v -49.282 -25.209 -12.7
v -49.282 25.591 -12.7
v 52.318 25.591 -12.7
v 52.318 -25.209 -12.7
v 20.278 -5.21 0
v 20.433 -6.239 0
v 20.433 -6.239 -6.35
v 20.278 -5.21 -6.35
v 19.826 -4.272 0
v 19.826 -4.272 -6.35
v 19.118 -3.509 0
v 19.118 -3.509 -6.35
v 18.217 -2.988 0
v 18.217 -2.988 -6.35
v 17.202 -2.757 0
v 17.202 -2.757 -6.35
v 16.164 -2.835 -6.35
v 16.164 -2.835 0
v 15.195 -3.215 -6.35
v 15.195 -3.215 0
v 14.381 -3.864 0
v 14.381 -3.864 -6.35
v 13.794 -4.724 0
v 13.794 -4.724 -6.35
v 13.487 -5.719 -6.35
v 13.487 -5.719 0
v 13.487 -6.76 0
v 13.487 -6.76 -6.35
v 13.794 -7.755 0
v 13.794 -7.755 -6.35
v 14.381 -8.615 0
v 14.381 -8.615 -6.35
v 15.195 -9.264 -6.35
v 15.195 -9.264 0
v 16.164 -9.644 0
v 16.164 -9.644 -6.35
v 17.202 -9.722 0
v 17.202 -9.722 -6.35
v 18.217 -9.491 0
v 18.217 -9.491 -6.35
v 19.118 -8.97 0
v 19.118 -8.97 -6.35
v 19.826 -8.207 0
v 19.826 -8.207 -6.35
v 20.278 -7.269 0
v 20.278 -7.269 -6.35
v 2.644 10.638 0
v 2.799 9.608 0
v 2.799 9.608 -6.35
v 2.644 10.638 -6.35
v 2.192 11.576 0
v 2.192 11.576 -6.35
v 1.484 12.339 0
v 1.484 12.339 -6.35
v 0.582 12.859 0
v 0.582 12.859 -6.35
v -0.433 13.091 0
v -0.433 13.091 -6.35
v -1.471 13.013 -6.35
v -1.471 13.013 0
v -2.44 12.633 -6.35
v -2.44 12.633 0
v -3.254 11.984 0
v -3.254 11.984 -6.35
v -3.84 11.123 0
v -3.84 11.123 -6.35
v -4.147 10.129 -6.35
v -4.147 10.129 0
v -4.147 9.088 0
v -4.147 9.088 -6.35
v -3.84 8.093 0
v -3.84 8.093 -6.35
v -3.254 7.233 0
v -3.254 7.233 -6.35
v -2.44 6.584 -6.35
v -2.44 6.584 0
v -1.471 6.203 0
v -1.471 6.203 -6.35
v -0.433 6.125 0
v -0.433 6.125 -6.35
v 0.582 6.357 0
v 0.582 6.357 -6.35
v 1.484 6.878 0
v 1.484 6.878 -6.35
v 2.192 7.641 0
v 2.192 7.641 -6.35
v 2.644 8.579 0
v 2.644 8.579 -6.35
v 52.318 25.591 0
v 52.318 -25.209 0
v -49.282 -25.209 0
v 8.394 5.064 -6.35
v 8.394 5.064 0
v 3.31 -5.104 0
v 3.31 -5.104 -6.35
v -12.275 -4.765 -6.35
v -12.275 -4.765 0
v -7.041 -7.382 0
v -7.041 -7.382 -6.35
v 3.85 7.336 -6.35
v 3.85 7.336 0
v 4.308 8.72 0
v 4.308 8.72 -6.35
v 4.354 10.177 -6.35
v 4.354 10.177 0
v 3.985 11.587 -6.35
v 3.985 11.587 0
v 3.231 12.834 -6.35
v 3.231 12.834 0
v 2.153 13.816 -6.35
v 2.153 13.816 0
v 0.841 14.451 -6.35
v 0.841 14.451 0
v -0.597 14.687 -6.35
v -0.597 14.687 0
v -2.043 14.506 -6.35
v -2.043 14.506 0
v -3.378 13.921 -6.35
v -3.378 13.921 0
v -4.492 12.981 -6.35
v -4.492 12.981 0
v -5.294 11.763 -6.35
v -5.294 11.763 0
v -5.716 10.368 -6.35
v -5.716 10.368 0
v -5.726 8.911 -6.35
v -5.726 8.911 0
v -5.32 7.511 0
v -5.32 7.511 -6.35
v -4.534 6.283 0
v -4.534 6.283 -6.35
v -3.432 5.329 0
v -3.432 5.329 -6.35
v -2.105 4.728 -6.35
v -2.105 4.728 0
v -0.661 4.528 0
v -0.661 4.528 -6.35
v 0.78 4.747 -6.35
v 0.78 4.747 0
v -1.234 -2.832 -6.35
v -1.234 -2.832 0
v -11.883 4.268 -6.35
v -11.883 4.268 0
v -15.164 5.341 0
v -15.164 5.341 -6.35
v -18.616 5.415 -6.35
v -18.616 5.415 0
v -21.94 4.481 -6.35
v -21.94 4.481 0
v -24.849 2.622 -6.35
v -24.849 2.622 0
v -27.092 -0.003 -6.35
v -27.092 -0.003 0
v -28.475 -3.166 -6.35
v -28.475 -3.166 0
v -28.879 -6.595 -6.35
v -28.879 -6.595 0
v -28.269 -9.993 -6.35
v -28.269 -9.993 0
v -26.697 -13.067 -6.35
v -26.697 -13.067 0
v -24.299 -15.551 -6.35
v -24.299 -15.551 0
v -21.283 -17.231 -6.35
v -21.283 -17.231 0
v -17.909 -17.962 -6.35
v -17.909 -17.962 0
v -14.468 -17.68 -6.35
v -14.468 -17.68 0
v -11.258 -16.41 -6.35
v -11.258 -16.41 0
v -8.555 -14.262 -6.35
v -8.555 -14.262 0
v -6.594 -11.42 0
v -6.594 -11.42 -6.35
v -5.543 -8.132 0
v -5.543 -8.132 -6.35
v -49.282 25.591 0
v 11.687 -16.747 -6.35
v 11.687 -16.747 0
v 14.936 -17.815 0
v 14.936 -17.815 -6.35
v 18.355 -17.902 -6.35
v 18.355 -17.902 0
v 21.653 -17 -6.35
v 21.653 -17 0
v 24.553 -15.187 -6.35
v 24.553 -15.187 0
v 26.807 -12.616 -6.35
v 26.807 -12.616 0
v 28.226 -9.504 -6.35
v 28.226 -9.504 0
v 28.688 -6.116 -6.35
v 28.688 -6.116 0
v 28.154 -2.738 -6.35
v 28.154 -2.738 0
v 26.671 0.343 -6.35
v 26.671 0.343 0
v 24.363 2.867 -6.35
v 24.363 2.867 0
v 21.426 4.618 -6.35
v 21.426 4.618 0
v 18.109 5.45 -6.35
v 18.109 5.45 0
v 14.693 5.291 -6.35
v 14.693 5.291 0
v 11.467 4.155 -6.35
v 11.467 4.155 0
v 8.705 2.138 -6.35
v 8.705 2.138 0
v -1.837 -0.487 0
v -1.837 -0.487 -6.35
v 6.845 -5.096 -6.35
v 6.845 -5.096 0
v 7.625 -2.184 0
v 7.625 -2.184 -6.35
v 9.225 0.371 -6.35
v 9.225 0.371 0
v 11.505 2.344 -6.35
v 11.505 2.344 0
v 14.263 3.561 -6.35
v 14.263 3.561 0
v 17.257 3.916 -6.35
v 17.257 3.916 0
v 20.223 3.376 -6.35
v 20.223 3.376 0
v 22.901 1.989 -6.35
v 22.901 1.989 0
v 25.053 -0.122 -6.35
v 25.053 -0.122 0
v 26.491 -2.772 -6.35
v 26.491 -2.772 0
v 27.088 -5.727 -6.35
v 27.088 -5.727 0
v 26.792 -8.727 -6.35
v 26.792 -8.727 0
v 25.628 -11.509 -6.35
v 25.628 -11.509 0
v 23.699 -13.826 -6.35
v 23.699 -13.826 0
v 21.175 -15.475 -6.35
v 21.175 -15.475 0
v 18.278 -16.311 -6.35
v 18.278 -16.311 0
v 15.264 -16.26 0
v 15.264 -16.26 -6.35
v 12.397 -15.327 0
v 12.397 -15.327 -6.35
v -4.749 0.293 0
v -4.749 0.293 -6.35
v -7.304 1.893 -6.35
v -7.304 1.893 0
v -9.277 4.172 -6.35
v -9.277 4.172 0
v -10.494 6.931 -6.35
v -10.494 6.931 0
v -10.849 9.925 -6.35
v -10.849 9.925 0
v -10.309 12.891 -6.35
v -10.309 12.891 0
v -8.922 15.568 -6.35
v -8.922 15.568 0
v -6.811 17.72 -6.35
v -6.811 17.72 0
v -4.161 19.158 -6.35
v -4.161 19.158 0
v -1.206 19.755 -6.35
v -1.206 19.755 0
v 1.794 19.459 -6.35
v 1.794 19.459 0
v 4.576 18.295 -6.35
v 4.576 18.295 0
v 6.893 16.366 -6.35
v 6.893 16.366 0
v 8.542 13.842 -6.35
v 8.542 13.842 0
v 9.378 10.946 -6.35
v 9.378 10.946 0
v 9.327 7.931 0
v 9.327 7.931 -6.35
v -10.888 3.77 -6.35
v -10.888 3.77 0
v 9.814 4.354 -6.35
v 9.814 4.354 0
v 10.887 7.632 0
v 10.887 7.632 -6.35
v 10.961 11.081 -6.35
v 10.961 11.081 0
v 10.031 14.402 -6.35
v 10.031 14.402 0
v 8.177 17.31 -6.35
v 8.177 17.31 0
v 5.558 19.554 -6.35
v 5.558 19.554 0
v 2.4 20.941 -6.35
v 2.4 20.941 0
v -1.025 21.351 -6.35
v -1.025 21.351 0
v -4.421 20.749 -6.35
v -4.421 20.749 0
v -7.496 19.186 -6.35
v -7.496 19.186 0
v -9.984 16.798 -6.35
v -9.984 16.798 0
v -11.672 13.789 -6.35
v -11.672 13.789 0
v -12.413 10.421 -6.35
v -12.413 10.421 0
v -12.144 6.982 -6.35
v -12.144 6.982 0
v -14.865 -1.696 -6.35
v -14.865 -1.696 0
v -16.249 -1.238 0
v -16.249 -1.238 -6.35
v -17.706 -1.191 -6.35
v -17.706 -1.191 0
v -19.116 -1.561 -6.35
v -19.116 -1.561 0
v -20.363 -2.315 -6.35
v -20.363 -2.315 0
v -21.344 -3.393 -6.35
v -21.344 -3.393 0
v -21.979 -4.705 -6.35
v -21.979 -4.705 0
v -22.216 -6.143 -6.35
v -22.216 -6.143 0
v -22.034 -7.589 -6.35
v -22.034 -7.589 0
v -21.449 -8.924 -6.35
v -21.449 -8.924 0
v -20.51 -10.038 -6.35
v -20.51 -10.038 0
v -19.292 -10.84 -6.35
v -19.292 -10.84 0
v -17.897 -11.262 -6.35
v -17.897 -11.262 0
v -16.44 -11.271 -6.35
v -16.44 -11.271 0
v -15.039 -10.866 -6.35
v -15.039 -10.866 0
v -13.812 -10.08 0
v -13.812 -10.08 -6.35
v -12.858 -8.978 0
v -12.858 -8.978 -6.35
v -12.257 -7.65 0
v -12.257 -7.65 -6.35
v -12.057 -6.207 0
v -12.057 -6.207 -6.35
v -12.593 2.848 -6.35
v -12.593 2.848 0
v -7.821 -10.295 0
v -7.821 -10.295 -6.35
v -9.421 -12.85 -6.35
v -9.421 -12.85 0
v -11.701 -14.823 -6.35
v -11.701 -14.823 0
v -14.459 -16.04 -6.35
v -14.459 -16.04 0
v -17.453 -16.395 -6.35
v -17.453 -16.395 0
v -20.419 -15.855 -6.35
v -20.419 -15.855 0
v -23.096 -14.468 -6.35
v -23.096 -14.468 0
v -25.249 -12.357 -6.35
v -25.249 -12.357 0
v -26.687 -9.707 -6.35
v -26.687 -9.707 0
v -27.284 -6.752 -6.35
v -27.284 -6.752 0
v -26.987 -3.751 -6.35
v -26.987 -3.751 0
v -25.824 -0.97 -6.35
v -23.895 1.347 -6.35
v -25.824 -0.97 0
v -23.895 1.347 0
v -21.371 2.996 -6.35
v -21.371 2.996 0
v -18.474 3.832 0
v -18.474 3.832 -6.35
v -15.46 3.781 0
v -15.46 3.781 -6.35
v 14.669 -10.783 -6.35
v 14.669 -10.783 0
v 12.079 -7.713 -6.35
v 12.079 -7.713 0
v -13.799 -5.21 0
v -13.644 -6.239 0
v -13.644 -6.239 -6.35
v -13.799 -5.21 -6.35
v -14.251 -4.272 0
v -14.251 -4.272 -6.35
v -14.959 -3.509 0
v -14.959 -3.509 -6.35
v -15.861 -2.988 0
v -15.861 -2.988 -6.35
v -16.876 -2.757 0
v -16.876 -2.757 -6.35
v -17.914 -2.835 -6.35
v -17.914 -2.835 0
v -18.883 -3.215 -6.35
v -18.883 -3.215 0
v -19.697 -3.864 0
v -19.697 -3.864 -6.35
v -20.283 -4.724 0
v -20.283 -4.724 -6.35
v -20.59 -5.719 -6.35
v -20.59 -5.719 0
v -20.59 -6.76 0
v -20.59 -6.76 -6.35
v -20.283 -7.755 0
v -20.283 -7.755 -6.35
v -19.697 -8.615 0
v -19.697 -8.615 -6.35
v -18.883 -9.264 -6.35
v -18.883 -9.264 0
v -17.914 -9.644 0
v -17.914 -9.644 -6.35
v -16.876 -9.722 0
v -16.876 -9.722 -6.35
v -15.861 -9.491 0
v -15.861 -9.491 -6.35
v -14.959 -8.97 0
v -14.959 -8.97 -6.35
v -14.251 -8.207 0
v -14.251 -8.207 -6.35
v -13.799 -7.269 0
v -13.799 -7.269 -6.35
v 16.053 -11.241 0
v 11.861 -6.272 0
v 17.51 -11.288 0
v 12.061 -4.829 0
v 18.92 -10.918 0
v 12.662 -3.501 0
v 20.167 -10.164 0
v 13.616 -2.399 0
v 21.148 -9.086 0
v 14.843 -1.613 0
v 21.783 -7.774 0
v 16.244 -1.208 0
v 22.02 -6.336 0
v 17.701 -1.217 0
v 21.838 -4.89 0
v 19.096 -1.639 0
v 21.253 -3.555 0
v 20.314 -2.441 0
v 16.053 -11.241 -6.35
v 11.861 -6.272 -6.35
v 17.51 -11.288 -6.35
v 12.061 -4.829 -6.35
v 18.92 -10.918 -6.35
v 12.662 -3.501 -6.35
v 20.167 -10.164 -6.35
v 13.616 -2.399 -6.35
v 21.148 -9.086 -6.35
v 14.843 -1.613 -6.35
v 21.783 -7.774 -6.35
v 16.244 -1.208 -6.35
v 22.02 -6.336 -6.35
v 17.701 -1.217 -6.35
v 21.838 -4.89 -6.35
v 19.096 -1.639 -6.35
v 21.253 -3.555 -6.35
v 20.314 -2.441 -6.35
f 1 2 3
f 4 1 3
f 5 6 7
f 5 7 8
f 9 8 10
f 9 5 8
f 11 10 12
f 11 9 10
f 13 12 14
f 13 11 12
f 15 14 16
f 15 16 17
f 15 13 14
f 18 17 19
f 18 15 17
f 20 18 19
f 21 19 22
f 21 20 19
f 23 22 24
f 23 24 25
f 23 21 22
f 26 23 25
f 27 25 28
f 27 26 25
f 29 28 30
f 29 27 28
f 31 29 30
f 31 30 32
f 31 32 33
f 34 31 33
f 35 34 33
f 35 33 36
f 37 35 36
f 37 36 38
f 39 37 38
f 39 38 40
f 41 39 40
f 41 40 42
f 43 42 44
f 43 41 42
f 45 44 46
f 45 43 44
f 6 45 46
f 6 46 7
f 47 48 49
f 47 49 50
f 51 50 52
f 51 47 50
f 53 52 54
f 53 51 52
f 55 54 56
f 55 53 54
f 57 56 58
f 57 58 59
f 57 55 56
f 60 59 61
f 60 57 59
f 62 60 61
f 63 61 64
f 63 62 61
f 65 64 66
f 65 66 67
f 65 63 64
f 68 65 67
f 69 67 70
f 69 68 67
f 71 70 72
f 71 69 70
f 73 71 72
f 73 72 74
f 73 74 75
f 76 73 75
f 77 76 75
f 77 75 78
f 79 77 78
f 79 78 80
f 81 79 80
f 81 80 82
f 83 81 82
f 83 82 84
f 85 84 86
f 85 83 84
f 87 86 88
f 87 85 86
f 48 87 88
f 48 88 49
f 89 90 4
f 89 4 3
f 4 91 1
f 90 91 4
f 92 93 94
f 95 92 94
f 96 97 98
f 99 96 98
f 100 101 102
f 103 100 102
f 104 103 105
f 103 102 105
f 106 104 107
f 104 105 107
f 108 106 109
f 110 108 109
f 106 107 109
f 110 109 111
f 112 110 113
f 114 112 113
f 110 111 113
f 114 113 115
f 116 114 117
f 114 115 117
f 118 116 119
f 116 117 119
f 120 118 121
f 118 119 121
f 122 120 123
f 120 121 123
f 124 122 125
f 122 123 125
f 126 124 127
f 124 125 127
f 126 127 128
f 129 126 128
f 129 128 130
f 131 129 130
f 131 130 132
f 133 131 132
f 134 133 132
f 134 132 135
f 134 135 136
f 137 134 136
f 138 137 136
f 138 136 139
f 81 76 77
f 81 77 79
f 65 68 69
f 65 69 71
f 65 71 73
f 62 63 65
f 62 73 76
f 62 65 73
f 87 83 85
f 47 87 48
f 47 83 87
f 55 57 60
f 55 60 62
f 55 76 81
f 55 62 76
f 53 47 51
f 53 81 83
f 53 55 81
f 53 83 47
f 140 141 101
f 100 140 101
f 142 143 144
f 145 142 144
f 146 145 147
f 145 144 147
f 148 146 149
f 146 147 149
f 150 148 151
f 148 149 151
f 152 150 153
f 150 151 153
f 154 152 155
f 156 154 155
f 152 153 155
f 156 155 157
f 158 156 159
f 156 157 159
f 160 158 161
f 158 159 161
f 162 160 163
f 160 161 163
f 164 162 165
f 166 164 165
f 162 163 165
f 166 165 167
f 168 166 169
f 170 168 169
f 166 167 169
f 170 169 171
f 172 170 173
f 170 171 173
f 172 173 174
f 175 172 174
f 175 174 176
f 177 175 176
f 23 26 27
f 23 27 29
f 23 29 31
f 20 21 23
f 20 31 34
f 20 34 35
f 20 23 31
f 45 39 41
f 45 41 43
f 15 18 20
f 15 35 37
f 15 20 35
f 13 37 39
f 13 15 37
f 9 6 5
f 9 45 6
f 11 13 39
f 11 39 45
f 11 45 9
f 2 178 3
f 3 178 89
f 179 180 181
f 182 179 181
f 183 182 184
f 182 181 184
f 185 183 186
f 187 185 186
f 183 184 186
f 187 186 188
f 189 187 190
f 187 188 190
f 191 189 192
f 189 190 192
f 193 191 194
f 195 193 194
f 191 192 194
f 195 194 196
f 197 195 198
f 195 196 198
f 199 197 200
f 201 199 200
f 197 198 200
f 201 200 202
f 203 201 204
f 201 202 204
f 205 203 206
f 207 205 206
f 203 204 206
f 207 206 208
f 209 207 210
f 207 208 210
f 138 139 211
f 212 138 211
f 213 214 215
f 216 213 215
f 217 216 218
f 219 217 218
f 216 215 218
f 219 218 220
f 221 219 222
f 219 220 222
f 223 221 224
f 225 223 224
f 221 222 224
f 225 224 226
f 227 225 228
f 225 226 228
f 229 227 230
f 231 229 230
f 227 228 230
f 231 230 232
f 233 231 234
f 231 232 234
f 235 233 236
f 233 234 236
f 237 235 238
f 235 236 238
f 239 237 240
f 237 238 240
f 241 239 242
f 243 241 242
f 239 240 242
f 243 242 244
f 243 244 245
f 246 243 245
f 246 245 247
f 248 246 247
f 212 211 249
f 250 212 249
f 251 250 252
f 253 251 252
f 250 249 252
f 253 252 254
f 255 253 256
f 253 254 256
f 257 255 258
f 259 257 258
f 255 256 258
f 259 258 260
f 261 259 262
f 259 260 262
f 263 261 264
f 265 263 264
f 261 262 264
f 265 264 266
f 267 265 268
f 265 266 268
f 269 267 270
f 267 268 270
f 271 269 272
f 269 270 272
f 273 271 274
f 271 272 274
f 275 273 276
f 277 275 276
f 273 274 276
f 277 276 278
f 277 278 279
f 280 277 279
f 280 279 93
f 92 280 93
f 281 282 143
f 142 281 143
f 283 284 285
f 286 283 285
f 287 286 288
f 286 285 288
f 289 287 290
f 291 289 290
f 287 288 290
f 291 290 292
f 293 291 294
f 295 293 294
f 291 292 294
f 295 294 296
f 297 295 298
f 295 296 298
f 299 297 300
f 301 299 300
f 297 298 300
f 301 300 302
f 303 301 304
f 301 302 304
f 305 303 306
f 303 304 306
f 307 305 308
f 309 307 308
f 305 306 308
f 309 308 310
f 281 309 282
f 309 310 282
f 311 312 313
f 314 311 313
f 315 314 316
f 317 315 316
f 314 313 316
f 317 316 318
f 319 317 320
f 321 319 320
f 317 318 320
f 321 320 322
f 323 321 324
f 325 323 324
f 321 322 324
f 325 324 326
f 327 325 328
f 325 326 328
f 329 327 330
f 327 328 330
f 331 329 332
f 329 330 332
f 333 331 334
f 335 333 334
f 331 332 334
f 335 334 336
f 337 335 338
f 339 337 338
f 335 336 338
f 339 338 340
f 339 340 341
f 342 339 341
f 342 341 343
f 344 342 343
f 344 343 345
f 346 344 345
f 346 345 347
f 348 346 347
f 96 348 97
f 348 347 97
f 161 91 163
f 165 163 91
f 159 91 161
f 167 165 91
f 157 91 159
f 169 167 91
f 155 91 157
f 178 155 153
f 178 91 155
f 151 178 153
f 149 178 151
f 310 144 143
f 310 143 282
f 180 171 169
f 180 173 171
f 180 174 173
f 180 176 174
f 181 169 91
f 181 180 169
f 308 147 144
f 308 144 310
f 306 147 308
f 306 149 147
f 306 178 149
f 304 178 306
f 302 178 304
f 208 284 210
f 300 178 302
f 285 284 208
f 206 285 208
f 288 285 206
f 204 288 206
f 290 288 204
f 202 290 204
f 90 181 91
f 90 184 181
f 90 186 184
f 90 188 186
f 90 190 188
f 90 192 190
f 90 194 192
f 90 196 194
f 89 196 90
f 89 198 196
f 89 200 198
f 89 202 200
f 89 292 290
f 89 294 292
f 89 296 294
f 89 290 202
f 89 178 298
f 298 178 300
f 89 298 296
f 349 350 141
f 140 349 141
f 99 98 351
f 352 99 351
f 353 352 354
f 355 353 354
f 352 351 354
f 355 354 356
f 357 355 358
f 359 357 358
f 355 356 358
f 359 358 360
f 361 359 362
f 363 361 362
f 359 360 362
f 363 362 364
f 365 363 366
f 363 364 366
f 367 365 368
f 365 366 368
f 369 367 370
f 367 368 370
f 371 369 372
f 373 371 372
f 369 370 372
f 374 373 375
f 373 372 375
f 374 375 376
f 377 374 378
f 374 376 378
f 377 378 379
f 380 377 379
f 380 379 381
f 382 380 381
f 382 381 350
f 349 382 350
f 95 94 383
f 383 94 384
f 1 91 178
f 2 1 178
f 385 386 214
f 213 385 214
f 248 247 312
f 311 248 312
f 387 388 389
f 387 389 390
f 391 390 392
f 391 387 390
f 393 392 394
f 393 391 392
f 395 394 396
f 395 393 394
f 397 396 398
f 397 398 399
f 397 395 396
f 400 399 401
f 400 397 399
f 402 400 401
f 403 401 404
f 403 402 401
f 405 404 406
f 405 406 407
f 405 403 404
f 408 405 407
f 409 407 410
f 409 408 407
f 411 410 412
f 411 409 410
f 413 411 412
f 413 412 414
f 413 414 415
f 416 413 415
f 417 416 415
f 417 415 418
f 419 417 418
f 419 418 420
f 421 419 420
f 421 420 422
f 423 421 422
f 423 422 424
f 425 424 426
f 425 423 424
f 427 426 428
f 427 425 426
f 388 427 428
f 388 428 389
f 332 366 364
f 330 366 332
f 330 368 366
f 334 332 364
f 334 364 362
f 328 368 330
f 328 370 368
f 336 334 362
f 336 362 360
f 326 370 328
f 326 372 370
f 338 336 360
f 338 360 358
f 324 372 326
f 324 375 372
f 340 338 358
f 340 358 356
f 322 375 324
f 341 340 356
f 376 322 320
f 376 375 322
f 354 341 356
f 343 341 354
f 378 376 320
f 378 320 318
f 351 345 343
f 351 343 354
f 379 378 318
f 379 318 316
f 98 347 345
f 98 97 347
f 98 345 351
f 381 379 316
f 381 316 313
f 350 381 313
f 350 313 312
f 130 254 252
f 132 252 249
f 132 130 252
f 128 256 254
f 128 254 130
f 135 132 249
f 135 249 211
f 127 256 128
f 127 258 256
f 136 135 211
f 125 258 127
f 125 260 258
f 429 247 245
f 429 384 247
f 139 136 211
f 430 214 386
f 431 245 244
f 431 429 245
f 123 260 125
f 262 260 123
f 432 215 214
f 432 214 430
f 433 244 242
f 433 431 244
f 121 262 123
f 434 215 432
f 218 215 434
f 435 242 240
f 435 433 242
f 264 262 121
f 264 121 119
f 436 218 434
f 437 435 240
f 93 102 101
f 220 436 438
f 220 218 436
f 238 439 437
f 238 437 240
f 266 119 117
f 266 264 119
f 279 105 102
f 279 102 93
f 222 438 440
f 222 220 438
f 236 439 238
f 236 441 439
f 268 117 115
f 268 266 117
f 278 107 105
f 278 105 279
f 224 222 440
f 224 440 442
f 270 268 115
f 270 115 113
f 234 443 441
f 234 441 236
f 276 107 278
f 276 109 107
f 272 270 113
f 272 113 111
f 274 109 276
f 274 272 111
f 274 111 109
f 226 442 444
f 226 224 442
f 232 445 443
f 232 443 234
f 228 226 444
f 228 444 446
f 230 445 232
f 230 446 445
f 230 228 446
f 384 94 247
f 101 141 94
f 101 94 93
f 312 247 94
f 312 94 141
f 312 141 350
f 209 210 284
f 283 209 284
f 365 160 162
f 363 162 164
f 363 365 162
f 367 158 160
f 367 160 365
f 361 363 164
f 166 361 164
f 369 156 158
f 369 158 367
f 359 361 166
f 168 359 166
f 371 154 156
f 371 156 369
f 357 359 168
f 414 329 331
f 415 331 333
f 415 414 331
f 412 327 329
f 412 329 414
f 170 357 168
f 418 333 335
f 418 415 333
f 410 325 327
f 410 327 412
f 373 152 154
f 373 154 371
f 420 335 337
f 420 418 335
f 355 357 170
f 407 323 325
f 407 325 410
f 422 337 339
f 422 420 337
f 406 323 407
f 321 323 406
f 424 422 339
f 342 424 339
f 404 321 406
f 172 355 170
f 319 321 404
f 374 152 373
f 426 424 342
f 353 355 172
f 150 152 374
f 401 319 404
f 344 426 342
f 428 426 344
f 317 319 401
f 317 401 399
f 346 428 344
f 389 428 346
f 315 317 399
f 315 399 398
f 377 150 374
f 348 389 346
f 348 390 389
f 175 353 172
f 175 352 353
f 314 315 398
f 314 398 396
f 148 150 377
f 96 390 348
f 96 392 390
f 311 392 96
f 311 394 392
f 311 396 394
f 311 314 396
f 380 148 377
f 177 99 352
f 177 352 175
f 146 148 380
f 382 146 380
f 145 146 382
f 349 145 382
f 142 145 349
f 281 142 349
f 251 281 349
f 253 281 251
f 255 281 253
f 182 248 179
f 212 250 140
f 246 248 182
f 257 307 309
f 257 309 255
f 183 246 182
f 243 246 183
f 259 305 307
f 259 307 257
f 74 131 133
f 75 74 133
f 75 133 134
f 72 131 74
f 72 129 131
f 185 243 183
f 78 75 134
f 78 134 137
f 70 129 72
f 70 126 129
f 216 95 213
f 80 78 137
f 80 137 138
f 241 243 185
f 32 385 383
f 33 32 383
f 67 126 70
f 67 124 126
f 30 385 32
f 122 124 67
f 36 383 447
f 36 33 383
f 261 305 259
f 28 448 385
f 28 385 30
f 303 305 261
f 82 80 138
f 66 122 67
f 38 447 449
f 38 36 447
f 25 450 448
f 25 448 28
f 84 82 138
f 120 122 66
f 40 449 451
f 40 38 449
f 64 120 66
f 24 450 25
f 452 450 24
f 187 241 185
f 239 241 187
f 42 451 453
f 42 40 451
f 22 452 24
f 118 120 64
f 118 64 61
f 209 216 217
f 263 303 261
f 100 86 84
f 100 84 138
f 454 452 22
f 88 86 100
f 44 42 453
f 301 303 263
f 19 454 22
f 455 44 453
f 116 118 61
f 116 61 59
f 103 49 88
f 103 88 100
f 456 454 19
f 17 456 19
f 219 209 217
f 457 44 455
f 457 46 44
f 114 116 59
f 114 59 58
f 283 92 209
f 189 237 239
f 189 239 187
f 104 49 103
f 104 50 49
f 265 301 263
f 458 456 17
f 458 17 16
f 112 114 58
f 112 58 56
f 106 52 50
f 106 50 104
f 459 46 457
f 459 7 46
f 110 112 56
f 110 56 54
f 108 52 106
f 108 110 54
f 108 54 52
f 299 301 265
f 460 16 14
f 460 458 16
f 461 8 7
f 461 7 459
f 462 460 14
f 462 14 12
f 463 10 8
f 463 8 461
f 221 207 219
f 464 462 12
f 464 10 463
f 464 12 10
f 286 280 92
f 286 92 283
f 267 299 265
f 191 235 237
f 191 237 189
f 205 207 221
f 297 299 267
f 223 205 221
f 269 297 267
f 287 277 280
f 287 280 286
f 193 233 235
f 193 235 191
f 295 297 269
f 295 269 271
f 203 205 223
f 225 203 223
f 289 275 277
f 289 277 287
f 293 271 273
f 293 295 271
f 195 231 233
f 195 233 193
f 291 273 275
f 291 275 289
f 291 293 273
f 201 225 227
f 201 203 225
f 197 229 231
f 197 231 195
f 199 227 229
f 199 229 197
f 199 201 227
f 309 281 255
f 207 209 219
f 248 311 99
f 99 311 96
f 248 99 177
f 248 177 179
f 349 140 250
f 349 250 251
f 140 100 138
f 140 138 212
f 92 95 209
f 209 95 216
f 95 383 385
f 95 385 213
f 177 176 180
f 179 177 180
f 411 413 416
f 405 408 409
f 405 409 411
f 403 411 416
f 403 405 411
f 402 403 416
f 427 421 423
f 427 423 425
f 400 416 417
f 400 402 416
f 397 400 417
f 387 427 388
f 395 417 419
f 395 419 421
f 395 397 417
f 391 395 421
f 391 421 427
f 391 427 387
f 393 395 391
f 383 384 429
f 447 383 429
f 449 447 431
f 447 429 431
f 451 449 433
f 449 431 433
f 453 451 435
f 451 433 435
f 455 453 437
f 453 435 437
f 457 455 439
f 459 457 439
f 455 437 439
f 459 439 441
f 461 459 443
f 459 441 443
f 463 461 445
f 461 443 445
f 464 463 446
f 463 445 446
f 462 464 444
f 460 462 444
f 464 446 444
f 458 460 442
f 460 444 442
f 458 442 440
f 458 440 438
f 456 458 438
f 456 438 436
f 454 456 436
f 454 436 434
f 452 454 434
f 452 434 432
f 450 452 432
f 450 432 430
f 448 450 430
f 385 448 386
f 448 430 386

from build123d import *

# Parameters (mm, degrees)
F0_W     = 101.6
F0_H     = 50.8
F1_DEPTH = 12.7
F2_R     = 3.4925
F3_DEPTH = 6.35


with BuildPart() as f1:
    # F0 (on Top) → F1 (new body)
    with BuildSketch(Plane.XY):
        with Locations((1.517599, 0.191483)):
            Rectangle(F0_W, F0_H)
    extrude(amount=-F1_DEPTH)

    # F2 (on Top) → F3 (cut)
    with BuildSketch(Plane.XY):
        with BuildLine():
            Line((8.705417, 2.137989), (9.813658, 4.354471))
            ThreePointArc((9.813658, 4.354471), (-1.02506, 21.350936), (-10.887856, 3.770183))
            Line((-10.887856, 3.770183), (-11.883179, 4.267844))
            ThreePointArc((-11.883179, 4.267844), (-27.596218, -11.587781), (-5.542731, -8.13175))
            Line((-5.542731, -8.13175), (11.687214, -16.746723))
            ThreePointArc((11.687214, -16.746723), (28.544601, -4.407269), (8.705417, 2.137989))
        make_face()
        with Locations((-17.136821, -6.239439)):
            Circle(F2_R, mode=Mode.SUBTRACT)
        with BuildLine():
            Line((12.397165, -15.326819), (-14.864975, -1.695749))
            ThreePointArc((-14.864975, -1.695749), (-21.019695, -9.515059), (-12.27537, -4.765431))
            Line((-12.27537, -4.765431), (-7.041321, -7.382455))
            ThreePointArc((-7.041321, -7.382455), (-26.066643, -11.085456), (-12.59313, 2.847941))
            Line((-12.59313, 2.847941), (-1.233905, -2.831672))
            Line((-1.233905, -2.831672), (3.850064, 7.336267))
            ThreePointArc((3.850064, 7.336267), (-3.969246, 13.490986), (0.780383, 4.746662))
            Line((0.780383, 4.746662), (-1.836642, -0.487387))
            ThreePointArc((-1.836642, -0.487387), (-5.539642, 18.537934), (8.393754, 5.064422))
            Line((8.393754, 5.064422), (3.309785, -5.103517))
            Line((3.309785, -5.103517), (14.66901, -10.783129))
            ThreePointArc((14.66901, -10.783129), (20.82373, -2.963819), (12.079405, -7.713448))
            Line((12.079405, -7.713448), (6.845356, -5.096423))
            ThreePointArc((6.845356, -5.096423), (25.870677, -1.393423), (12.397165, -15.326819))
        make_face(mode=Mode.SUBTRACT)
        with Locations((16.940855, -6.239439)):
            Circle(F2_R, mode=Mode.SUBTRACT)
        with Locations((-0.693626, 9.608112)):
            Circle(F2_R, mode=Mode.SUBTRACT)
    extrude(amount=-F3_DEPTH, mode=Mode.SUBTRACT)


solid = f1.part
